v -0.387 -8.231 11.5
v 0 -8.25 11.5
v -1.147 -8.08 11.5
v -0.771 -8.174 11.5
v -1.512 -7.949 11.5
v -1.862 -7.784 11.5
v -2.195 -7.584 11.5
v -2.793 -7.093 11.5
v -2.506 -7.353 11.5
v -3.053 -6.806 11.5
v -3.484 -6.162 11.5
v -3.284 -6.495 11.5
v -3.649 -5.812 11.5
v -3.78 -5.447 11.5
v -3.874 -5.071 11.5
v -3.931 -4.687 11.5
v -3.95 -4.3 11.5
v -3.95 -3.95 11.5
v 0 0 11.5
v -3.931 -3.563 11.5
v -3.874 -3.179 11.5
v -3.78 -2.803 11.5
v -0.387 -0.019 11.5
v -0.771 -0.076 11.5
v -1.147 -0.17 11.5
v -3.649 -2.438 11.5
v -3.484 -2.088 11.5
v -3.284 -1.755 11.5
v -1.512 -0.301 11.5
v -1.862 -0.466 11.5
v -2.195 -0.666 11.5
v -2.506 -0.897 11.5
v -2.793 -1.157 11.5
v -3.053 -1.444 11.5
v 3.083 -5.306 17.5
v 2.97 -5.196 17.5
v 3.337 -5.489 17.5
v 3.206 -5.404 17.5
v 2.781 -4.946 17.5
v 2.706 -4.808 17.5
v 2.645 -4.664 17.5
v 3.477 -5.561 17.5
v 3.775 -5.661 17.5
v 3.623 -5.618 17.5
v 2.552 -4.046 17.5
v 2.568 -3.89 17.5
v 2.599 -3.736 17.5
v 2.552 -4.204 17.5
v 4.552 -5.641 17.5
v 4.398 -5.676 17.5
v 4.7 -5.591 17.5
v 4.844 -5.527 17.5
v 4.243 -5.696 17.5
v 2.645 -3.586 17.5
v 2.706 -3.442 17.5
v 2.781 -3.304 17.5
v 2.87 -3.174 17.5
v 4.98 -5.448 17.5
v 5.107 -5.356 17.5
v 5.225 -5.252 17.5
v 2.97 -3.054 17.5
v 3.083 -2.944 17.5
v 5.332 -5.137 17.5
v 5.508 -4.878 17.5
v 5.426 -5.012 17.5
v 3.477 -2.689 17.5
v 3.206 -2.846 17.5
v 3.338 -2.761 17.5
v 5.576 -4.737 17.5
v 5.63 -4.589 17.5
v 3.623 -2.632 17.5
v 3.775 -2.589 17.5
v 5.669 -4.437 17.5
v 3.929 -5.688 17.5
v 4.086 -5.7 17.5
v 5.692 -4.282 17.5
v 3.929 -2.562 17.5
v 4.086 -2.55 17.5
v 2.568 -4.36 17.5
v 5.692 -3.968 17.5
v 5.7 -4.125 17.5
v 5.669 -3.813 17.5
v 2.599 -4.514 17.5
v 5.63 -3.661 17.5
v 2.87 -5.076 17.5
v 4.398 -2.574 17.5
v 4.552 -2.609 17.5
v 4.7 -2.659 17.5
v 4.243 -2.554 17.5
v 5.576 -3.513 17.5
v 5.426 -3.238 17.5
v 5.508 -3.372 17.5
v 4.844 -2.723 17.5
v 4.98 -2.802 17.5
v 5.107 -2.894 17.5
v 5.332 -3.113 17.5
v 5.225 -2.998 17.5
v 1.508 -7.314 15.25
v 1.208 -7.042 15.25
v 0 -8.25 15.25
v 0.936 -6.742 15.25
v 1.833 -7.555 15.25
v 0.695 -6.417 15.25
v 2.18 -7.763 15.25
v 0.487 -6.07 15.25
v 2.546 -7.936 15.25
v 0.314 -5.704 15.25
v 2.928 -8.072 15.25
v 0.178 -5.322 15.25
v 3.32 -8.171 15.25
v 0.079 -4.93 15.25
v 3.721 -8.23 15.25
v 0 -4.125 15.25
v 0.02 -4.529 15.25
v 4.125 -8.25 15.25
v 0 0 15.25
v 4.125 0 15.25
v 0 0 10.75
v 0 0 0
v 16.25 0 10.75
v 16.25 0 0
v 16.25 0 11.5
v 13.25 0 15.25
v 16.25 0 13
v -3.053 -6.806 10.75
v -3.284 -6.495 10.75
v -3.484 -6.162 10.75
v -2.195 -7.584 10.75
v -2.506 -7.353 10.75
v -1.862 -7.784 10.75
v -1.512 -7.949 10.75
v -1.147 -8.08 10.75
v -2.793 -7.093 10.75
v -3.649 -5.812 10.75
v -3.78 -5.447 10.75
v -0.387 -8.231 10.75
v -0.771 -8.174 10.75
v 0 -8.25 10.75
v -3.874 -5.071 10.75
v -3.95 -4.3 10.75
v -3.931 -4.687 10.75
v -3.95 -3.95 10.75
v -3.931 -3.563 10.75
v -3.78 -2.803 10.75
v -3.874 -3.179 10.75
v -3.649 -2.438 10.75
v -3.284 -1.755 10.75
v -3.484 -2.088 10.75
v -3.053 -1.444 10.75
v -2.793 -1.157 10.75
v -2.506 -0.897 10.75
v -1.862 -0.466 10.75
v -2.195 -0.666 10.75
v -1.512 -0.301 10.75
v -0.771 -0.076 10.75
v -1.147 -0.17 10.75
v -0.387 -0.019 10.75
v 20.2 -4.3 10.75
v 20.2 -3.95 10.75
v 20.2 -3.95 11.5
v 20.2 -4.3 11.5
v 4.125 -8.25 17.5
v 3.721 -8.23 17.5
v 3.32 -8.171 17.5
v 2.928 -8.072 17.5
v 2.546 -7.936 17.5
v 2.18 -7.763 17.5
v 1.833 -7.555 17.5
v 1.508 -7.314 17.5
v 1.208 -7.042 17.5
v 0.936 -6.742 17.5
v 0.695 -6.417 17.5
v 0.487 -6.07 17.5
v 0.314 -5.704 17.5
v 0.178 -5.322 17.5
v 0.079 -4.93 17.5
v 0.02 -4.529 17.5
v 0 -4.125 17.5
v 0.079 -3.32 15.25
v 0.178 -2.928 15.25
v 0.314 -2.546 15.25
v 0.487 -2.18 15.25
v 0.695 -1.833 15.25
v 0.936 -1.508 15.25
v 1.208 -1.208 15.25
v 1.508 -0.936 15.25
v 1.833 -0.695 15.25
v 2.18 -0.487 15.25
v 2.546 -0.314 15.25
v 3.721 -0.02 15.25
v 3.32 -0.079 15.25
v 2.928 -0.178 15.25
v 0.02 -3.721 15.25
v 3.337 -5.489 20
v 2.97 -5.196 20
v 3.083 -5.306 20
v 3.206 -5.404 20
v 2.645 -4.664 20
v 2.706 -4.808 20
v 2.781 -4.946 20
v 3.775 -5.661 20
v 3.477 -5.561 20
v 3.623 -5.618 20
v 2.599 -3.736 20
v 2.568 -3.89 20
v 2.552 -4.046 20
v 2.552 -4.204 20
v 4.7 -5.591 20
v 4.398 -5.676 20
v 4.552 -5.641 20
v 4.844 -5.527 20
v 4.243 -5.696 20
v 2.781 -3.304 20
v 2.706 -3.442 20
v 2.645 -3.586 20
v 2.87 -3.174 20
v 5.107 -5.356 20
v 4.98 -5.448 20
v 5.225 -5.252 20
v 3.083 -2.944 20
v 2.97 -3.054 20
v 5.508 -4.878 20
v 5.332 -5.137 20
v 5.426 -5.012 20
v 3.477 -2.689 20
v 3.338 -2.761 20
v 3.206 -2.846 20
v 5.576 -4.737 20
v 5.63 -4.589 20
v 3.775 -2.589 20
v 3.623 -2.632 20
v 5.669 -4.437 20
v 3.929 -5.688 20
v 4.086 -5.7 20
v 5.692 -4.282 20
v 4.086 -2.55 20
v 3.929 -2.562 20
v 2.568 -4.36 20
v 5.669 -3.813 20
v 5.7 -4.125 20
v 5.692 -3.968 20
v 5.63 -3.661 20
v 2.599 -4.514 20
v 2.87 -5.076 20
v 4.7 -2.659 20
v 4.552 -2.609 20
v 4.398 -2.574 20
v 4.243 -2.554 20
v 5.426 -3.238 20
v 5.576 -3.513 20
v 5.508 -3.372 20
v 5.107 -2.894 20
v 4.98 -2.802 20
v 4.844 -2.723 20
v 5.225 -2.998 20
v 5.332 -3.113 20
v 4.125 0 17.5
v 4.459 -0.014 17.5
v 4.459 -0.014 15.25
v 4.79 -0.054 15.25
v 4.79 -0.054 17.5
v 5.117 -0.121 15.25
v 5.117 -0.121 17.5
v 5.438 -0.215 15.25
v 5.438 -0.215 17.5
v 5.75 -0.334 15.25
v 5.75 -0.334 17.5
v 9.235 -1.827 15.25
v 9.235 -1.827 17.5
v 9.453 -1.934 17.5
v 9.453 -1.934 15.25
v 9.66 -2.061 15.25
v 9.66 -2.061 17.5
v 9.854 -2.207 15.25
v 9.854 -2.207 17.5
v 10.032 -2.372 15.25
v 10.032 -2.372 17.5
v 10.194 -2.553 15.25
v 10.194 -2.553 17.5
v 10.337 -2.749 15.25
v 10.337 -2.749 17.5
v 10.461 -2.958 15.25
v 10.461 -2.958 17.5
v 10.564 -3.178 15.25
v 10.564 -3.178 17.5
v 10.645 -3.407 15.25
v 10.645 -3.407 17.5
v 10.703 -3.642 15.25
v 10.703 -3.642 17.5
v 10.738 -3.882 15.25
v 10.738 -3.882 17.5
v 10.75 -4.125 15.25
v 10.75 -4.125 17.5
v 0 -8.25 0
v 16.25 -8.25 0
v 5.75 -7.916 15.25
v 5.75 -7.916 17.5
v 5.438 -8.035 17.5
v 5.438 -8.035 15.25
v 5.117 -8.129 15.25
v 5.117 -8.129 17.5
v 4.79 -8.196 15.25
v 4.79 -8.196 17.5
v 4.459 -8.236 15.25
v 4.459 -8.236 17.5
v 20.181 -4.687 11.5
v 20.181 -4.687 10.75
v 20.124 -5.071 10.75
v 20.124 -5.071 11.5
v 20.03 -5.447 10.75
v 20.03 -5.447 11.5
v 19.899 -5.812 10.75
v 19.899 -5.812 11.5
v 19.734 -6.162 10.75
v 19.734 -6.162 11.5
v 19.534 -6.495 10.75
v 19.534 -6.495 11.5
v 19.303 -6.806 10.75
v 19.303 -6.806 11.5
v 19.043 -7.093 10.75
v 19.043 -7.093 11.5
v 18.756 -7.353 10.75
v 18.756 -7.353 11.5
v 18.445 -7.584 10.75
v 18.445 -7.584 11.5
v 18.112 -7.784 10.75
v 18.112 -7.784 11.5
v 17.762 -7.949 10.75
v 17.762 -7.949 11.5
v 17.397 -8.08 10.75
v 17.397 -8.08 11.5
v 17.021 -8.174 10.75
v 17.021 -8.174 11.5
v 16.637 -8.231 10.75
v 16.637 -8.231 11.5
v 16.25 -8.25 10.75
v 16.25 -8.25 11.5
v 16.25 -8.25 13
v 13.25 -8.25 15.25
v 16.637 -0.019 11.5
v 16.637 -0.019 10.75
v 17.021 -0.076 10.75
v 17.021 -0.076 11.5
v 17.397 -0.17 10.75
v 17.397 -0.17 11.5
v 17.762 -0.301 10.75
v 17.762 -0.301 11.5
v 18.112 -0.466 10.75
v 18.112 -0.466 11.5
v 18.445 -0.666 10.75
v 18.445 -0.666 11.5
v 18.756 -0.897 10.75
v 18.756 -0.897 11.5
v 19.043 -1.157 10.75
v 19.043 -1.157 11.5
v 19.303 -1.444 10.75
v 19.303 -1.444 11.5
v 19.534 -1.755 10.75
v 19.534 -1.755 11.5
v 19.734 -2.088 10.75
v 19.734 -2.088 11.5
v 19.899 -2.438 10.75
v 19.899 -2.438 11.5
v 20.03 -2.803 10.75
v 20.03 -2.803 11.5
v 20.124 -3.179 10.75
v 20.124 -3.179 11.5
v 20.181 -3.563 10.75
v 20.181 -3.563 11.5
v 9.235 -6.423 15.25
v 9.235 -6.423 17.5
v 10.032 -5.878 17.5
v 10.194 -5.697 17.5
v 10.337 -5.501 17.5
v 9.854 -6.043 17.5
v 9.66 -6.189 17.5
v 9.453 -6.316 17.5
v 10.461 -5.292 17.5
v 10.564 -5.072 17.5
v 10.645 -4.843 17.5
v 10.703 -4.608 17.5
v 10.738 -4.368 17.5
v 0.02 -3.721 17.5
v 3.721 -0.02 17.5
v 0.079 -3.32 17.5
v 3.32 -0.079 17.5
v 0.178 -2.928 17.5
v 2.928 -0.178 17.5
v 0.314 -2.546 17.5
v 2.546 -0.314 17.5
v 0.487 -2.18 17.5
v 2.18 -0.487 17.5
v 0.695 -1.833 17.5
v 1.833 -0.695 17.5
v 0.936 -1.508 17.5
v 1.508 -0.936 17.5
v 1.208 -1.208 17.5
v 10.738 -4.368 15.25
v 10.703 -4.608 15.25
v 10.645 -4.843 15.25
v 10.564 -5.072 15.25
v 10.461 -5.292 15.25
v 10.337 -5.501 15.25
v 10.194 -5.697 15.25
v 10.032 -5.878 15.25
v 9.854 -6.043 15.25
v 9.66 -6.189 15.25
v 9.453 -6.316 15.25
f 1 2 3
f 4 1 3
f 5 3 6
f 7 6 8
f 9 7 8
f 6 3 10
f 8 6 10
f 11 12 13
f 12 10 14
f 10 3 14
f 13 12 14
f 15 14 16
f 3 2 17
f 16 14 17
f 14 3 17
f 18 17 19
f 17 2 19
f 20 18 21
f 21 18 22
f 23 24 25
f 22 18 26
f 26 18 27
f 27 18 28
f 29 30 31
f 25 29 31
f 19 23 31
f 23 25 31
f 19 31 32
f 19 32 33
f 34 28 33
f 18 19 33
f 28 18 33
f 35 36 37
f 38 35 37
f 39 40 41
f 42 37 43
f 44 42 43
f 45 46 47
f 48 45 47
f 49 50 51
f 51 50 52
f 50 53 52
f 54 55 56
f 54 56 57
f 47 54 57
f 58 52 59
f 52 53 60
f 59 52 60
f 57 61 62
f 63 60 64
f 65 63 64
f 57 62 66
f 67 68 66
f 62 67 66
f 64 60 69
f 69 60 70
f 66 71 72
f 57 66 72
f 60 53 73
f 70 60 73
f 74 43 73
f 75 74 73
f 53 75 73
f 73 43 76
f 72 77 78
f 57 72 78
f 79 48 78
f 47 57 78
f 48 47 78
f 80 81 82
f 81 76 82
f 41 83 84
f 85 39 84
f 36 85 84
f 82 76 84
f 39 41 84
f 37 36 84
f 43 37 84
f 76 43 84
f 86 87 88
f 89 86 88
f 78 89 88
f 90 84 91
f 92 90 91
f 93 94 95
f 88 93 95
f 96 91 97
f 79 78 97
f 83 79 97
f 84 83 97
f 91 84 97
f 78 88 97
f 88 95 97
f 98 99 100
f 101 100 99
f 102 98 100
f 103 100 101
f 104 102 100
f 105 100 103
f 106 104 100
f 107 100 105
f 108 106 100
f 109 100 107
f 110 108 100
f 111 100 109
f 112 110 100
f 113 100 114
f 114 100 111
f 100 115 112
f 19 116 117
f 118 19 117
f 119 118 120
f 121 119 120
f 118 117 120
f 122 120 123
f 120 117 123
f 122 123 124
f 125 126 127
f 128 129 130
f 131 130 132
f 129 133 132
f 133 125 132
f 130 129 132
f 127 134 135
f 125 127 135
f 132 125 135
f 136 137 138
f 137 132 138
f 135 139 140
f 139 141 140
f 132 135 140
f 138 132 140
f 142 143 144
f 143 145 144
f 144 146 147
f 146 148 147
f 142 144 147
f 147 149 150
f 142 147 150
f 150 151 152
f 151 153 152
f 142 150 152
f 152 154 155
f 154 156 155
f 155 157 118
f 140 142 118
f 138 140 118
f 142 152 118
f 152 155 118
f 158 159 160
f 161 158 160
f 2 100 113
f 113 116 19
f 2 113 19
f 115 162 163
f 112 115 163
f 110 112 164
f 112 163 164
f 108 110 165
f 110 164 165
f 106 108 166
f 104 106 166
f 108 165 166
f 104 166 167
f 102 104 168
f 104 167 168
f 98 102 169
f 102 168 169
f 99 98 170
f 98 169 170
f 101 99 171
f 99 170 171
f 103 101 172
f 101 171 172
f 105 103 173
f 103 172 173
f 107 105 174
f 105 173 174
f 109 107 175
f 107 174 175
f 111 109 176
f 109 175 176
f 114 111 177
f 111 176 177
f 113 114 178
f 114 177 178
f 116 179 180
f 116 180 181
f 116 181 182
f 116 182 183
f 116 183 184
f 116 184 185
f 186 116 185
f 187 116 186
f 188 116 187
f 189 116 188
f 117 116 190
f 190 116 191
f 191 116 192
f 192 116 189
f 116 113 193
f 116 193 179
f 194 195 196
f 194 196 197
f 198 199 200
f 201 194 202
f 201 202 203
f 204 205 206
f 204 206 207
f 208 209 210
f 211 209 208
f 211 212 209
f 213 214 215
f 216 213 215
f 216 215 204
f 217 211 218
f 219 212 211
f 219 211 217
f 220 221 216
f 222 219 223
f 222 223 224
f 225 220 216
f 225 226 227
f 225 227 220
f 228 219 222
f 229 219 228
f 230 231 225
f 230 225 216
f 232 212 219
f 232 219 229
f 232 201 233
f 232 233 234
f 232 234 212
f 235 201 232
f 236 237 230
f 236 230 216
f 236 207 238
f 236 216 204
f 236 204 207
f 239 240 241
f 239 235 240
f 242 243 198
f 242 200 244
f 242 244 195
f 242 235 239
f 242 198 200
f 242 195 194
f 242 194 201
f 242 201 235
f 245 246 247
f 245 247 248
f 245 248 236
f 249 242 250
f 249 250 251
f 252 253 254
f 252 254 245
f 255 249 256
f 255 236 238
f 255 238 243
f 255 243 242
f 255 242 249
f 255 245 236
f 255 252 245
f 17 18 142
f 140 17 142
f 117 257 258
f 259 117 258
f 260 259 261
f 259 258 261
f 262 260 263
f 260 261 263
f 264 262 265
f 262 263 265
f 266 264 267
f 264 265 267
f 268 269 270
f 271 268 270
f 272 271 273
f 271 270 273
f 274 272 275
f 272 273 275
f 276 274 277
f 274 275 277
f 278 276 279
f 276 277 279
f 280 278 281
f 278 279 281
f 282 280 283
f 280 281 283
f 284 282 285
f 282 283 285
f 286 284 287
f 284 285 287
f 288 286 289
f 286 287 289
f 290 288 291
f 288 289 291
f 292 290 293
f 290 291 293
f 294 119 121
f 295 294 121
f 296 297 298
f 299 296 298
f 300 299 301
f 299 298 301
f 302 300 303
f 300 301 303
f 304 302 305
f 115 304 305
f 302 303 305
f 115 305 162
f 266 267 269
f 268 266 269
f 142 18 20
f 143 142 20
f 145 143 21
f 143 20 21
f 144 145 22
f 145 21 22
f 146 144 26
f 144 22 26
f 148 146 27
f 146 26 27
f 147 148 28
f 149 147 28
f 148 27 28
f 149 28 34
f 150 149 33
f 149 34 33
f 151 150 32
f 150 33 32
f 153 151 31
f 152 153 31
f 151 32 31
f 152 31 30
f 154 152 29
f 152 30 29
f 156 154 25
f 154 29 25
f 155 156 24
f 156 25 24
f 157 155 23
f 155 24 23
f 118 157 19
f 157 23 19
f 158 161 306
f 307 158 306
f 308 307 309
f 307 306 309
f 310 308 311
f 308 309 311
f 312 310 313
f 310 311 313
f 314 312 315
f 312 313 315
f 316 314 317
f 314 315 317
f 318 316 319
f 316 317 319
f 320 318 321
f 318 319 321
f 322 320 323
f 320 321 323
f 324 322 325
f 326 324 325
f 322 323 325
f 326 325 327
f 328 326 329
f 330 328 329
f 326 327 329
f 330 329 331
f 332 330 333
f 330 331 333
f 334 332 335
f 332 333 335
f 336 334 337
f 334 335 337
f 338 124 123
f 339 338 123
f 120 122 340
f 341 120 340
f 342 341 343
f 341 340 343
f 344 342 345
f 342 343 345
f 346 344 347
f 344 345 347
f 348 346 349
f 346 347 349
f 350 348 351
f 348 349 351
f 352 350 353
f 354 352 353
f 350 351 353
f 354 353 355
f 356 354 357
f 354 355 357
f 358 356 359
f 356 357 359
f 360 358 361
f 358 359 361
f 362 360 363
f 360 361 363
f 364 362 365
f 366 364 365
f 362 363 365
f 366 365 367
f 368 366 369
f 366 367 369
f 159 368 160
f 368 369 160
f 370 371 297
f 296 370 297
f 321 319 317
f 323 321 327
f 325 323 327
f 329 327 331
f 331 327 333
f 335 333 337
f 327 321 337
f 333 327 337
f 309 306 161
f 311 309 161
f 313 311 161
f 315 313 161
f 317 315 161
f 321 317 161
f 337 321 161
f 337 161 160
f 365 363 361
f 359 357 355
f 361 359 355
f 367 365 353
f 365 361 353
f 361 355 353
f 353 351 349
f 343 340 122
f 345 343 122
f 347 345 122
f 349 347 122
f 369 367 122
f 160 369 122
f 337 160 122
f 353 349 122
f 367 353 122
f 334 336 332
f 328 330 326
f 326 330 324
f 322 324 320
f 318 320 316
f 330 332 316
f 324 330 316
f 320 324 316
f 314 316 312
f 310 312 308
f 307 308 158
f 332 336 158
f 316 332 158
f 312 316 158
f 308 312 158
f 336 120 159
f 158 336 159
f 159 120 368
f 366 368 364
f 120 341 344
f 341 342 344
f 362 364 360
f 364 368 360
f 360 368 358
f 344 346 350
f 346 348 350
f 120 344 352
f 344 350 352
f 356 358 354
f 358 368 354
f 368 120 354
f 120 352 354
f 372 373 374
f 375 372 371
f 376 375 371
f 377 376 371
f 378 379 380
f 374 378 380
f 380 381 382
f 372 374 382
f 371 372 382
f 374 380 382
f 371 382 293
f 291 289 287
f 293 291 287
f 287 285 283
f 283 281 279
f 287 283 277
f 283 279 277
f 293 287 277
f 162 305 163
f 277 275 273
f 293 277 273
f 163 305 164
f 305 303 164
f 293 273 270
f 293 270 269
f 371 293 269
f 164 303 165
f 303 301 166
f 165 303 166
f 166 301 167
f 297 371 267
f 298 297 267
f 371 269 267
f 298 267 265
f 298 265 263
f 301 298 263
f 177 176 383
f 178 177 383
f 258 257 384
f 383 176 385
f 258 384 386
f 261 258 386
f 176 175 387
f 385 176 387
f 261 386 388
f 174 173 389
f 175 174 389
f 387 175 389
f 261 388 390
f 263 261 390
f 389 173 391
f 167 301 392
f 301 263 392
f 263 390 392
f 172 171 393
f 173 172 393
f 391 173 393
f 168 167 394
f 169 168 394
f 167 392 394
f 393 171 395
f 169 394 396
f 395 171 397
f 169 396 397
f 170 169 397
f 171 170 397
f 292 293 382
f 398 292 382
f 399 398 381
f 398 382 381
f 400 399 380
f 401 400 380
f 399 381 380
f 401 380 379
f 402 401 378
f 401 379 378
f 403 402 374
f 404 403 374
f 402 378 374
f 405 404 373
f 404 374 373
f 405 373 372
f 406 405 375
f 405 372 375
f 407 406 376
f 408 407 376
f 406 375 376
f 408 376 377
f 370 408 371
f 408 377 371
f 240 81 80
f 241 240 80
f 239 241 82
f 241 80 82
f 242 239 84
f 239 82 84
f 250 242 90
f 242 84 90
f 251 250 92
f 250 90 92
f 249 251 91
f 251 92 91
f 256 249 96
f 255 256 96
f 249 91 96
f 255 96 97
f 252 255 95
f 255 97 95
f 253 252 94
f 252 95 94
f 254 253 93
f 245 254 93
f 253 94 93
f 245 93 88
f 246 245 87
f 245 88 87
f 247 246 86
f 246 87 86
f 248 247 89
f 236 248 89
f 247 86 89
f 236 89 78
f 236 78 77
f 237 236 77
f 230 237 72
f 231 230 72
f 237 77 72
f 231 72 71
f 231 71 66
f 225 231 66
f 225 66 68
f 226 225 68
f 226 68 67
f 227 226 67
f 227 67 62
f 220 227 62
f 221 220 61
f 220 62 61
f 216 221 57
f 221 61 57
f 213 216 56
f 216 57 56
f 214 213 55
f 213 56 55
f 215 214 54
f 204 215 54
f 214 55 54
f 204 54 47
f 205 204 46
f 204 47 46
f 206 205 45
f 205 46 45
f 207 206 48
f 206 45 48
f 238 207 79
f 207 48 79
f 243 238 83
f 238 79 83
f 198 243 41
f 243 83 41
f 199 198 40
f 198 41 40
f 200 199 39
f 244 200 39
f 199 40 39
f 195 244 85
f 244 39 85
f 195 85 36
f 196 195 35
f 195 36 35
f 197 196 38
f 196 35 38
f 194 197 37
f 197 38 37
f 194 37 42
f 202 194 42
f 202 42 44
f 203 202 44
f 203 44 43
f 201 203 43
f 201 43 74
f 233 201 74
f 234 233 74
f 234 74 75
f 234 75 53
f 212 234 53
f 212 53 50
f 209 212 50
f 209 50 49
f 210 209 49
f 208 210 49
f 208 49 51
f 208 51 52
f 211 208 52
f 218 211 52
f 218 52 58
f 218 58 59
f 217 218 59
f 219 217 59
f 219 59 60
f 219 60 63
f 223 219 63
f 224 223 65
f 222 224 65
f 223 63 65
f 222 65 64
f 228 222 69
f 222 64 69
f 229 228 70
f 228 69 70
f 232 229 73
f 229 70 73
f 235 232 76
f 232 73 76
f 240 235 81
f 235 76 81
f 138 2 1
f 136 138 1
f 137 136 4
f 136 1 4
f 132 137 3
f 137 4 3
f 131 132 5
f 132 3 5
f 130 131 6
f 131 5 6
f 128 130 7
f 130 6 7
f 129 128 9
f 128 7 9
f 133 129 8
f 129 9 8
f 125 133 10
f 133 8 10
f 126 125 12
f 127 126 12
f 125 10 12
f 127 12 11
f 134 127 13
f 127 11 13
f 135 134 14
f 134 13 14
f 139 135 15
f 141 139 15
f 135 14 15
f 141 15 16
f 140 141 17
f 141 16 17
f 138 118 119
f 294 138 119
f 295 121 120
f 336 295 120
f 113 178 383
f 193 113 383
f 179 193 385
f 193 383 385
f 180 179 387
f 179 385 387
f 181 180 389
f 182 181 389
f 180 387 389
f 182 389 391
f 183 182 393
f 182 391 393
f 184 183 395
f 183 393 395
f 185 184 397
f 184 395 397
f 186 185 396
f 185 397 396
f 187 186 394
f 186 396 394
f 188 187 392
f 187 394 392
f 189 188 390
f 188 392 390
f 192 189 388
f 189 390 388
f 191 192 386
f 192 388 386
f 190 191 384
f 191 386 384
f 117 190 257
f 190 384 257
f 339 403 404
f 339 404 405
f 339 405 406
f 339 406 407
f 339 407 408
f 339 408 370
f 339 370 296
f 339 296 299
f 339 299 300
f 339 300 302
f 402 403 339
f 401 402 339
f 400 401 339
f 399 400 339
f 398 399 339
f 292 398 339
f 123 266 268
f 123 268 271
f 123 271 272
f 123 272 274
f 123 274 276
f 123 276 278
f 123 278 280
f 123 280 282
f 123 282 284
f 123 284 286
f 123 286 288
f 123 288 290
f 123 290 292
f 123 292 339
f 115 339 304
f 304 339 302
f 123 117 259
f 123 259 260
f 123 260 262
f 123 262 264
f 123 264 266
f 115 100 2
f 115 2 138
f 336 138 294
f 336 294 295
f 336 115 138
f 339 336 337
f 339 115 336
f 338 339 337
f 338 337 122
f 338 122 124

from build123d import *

# Parameters (mm, degrees)
F1_DEPTH = 8.25
F3_DEPTH = 0.75
F5_DEPTH = 2.25
F6_R     = 1.575
F7_DEPTH = 2.5


with BuildPart() as f1:
    # F0 (on Front) → F1 (new body)
    with BuildSketch(Plane.XZ):
        Polygon((0, 10.75), (0, 0), (16.25, 0), (16.25, 10.75), (20.2, 10.75), (20.2, 11.5), (16.25, 11.5), (16.25, 13), (13.25, 15.25), (10.75, 15.25), (10.75, 17.5), (0, 17.5), (0, 11.5), (-3.95, 11.5), (-3.95, 10.75), align=None)
    extrude(amount=F1_DEPTH)

    # F2 (on face) → F3 (cut, through all)
    with BuildSketch(Plane.XY.offset(11.5)):
        with BuildLine():
            ThreePointArc((0, -8.25), (-2.793072, -7.093072), (-3.95, -4.3))
            Line((-3.95, -4.3), (-3.95, -8.25))
            Line((-3.95, -8.25), (0, -8.25))
        make_face()
        with BuildLine():
            ThreePointArc((-3.95, -3.95), (-2.793072, -1.156928), (0, 0))
            Line((0, 0), (-3.95, 0))
            Line((-3.95, 0), (-3.95, -3.95))
        make_face()
        with BuildLine():
            Line((20.2, 0), (16.25, 0))
            ThreePointArc((16.25, 0), (19.043072, -1.156928), (20.2, -3.95))
            Line((20.2, -3.95), (20.2, 0))
        make_face()
        with BuildLine():
            Line((20.2, -8.25), (20.2, -4.3))
            ThreePointArc((20.2, -4.3), (19.043072, -7.093072), (16.25, -8.25))
            Line((16.25, -8.25), (20.2, -8.25))
        make_face()
    extrude(amount=-F3_DEPTH, mode=Mode.SUBTRACT)

    # F4 (on face) → F5 (cut, through all)
    with BuildSketch(Plane.XY.offset(17.5)):
        with BuildLine():
            ThreePointArc((4.125, -8.25), (1.208185, -7.041815), (0, -4.125))
            Line((0, -4.125), (0, -8.25))
            Line((0, -8.25), (4.125, -8.25))
        make_face()
        with BuildLine():
            ThreePointArc((0, -4.125), (1.208185, -1.208185), (4.125, 0))
            Line((4.125, 0), (0, 0))
            Line((0, 0), (0, -4.125))
        make_face()
        with BuildLine():
            ThreePointArc((4.125, 0), (4.954441, -0.084251), (5.75, -0.333562))
            Line((5.75, -0.333562), (9.234848, -1.827159))
            ThreePointArc((9.234848, -1.827159), (10.337118, -2.748795), (10.75, -4.125))
            Line((10.75, -4.125), (10.75, 0))
            Line((10.75, 0), (4.125, 0))
        make_face()
        with BuildLine():
            Line((10.75, -8.25), (10.75, -4.125))
            ThreePointArc((10.75, -4.125), (10.337118, -5.501205), (9.234848, -6.422841))
            Line((9.234848, -6.422841), (5.75, -7.916438))
            ThreePointArc((5.75, -7.916438), (4.954441, -8.165749), (4.125, -8.25))
            Line((4.125, -8.25), (10.75, -8.25))
        make_face()
    extrude(amount=-F5_DEPTH, mode=Mode.SUBTRACT)


with BuildPart() as f7:
    # F6 (on face) → F7 (new body)
    with BuildSketch(Plane.XY.offset(17.5)):
        with Locations((4.125, -4.125)):
            Circle(F6_R)
    extrude(amount=F7_DEPTH)


solid = Compound([f1.part, f7.part])
